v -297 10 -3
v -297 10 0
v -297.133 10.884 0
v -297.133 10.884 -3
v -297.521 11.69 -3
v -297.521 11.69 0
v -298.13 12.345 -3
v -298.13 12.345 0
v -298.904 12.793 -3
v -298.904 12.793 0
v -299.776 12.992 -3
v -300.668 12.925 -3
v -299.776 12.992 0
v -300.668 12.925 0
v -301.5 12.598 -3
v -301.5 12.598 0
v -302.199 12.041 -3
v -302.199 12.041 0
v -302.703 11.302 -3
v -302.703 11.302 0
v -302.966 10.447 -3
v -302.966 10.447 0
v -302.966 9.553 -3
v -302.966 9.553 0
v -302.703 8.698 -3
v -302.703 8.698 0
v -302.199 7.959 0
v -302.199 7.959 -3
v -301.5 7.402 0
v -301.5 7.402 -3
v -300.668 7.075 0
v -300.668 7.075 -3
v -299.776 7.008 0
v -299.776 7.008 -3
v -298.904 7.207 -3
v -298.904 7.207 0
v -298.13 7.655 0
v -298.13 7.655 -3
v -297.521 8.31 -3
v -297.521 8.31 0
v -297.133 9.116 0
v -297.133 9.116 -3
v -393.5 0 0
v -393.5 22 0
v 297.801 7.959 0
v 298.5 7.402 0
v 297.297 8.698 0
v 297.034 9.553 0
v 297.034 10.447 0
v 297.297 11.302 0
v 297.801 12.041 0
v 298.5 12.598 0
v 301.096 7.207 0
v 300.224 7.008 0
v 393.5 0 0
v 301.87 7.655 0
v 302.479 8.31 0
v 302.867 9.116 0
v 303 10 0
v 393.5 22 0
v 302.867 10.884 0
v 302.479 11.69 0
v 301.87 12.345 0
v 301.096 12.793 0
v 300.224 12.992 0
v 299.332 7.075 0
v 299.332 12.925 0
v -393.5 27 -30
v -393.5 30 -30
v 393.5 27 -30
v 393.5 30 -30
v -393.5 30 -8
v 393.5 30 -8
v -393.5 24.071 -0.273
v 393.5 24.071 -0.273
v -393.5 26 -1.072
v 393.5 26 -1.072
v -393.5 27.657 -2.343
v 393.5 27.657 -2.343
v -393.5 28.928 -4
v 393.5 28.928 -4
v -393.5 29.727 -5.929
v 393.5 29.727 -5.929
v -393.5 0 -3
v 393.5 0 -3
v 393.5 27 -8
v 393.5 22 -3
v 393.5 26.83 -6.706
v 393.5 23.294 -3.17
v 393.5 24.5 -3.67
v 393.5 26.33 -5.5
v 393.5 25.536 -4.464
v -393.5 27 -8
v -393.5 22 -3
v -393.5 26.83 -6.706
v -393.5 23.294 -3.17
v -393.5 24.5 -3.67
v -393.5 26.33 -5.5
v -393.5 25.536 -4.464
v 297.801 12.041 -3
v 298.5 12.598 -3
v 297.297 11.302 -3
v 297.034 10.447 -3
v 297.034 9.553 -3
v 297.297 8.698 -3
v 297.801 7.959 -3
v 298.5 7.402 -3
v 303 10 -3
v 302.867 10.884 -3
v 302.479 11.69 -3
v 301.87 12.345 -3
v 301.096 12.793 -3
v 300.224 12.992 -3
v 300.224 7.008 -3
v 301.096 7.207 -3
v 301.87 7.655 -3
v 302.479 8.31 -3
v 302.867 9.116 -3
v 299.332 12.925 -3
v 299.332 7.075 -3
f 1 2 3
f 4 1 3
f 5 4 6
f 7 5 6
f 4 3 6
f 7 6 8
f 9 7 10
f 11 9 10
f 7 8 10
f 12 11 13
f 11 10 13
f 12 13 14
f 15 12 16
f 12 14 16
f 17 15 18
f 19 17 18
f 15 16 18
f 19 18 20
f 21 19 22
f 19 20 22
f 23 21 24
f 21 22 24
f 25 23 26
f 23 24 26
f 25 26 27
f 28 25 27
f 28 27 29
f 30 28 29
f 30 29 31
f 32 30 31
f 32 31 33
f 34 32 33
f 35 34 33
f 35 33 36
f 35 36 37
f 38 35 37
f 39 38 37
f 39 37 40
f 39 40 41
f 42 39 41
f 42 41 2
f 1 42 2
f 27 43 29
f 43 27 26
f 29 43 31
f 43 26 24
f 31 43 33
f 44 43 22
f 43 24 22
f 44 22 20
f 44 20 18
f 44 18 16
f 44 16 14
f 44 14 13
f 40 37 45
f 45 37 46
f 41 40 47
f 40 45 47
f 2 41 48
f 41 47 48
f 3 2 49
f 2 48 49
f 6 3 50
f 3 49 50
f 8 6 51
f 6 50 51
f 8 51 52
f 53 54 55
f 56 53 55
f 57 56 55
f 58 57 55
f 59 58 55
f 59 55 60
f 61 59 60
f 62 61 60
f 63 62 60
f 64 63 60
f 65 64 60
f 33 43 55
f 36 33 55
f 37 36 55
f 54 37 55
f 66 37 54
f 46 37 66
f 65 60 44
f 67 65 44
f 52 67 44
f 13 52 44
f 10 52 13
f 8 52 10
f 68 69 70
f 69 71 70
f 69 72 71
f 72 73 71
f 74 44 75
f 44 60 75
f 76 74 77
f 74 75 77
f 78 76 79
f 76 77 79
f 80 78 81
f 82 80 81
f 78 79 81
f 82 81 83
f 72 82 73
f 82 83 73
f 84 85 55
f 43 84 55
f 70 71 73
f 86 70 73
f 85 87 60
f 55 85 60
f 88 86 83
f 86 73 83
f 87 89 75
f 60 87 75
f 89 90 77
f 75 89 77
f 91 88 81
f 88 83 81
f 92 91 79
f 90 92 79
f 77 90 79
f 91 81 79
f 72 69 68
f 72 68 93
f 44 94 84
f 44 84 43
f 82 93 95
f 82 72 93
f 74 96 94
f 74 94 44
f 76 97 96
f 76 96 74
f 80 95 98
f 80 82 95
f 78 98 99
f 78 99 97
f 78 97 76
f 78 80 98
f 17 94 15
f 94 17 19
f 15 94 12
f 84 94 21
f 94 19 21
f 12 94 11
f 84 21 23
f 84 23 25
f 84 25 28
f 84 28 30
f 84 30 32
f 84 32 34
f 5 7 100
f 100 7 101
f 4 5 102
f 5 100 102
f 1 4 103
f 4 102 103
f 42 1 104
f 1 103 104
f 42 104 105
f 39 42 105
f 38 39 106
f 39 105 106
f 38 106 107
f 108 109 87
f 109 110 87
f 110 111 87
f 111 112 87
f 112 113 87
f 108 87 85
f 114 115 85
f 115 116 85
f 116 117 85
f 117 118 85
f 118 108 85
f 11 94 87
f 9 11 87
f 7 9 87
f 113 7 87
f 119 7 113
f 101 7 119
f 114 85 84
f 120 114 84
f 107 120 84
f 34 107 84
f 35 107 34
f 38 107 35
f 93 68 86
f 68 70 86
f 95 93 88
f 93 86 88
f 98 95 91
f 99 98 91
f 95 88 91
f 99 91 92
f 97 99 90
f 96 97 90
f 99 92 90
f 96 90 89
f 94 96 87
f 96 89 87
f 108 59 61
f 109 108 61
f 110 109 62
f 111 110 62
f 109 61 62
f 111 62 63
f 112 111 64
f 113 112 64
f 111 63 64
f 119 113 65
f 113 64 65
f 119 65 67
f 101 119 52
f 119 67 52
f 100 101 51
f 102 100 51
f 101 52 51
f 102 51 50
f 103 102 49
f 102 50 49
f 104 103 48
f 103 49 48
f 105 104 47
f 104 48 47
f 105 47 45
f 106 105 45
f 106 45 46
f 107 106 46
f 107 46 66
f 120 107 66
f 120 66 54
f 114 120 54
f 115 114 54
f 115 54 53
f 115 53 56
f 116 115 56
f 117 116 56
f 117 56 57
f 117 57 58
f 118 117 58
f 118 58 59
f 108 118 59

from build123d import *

# Parameters (mm, degrees)
SM_BASE_FLANGE_1_DEPTH = 393.5
SKETCH_3_R             = 3
CUT_EXTRUDE_1_DEPTH    = 396.780557885


# Sheet-metal steps are written as plain solids
with BuildPart() as part:
    # Sketch 1 → Базовая кромка1 (new, symmetric)
    with BuildSketch(Plane(origin=(0, 0, 0), x_dir=(0, 0, -1), z_dir=(1, 0, 0))):
        with BuildLine():
            Line((0, 0), (0, 22))
            ThreePointArc((0, 22), (2.343145751, 27.656854249), (8, 30))
            Line((8, 30), (30, 30))
            Line((30, 30), (30, 27))
            Line((30, 27), (8, 27))
            ThreePointArc((8, 27), (4.464466094, 25.535533906), (3, 22))
            Line((3, 22), (3, 0))
            Line((3, 0), (0, 0))
        make_face()
    extrude(amount=SM_BASE_FLANGE_1_DEPTH, both=True)

    # Эскиз3 → Вырез-Вытянуть1 (cut, through all)
    with BuildSketch(Plane.XY):
        with Locations((300, 10)):
            Circle(SKETCH_3_R)
        with Locations((-300, 10)):
            Circle(SKETCH_3_R)
    extrude(amount=-CUT_EXTRUDE_1_DEPTH, mode=Mode.SUBTRACT)


solid = part.part
